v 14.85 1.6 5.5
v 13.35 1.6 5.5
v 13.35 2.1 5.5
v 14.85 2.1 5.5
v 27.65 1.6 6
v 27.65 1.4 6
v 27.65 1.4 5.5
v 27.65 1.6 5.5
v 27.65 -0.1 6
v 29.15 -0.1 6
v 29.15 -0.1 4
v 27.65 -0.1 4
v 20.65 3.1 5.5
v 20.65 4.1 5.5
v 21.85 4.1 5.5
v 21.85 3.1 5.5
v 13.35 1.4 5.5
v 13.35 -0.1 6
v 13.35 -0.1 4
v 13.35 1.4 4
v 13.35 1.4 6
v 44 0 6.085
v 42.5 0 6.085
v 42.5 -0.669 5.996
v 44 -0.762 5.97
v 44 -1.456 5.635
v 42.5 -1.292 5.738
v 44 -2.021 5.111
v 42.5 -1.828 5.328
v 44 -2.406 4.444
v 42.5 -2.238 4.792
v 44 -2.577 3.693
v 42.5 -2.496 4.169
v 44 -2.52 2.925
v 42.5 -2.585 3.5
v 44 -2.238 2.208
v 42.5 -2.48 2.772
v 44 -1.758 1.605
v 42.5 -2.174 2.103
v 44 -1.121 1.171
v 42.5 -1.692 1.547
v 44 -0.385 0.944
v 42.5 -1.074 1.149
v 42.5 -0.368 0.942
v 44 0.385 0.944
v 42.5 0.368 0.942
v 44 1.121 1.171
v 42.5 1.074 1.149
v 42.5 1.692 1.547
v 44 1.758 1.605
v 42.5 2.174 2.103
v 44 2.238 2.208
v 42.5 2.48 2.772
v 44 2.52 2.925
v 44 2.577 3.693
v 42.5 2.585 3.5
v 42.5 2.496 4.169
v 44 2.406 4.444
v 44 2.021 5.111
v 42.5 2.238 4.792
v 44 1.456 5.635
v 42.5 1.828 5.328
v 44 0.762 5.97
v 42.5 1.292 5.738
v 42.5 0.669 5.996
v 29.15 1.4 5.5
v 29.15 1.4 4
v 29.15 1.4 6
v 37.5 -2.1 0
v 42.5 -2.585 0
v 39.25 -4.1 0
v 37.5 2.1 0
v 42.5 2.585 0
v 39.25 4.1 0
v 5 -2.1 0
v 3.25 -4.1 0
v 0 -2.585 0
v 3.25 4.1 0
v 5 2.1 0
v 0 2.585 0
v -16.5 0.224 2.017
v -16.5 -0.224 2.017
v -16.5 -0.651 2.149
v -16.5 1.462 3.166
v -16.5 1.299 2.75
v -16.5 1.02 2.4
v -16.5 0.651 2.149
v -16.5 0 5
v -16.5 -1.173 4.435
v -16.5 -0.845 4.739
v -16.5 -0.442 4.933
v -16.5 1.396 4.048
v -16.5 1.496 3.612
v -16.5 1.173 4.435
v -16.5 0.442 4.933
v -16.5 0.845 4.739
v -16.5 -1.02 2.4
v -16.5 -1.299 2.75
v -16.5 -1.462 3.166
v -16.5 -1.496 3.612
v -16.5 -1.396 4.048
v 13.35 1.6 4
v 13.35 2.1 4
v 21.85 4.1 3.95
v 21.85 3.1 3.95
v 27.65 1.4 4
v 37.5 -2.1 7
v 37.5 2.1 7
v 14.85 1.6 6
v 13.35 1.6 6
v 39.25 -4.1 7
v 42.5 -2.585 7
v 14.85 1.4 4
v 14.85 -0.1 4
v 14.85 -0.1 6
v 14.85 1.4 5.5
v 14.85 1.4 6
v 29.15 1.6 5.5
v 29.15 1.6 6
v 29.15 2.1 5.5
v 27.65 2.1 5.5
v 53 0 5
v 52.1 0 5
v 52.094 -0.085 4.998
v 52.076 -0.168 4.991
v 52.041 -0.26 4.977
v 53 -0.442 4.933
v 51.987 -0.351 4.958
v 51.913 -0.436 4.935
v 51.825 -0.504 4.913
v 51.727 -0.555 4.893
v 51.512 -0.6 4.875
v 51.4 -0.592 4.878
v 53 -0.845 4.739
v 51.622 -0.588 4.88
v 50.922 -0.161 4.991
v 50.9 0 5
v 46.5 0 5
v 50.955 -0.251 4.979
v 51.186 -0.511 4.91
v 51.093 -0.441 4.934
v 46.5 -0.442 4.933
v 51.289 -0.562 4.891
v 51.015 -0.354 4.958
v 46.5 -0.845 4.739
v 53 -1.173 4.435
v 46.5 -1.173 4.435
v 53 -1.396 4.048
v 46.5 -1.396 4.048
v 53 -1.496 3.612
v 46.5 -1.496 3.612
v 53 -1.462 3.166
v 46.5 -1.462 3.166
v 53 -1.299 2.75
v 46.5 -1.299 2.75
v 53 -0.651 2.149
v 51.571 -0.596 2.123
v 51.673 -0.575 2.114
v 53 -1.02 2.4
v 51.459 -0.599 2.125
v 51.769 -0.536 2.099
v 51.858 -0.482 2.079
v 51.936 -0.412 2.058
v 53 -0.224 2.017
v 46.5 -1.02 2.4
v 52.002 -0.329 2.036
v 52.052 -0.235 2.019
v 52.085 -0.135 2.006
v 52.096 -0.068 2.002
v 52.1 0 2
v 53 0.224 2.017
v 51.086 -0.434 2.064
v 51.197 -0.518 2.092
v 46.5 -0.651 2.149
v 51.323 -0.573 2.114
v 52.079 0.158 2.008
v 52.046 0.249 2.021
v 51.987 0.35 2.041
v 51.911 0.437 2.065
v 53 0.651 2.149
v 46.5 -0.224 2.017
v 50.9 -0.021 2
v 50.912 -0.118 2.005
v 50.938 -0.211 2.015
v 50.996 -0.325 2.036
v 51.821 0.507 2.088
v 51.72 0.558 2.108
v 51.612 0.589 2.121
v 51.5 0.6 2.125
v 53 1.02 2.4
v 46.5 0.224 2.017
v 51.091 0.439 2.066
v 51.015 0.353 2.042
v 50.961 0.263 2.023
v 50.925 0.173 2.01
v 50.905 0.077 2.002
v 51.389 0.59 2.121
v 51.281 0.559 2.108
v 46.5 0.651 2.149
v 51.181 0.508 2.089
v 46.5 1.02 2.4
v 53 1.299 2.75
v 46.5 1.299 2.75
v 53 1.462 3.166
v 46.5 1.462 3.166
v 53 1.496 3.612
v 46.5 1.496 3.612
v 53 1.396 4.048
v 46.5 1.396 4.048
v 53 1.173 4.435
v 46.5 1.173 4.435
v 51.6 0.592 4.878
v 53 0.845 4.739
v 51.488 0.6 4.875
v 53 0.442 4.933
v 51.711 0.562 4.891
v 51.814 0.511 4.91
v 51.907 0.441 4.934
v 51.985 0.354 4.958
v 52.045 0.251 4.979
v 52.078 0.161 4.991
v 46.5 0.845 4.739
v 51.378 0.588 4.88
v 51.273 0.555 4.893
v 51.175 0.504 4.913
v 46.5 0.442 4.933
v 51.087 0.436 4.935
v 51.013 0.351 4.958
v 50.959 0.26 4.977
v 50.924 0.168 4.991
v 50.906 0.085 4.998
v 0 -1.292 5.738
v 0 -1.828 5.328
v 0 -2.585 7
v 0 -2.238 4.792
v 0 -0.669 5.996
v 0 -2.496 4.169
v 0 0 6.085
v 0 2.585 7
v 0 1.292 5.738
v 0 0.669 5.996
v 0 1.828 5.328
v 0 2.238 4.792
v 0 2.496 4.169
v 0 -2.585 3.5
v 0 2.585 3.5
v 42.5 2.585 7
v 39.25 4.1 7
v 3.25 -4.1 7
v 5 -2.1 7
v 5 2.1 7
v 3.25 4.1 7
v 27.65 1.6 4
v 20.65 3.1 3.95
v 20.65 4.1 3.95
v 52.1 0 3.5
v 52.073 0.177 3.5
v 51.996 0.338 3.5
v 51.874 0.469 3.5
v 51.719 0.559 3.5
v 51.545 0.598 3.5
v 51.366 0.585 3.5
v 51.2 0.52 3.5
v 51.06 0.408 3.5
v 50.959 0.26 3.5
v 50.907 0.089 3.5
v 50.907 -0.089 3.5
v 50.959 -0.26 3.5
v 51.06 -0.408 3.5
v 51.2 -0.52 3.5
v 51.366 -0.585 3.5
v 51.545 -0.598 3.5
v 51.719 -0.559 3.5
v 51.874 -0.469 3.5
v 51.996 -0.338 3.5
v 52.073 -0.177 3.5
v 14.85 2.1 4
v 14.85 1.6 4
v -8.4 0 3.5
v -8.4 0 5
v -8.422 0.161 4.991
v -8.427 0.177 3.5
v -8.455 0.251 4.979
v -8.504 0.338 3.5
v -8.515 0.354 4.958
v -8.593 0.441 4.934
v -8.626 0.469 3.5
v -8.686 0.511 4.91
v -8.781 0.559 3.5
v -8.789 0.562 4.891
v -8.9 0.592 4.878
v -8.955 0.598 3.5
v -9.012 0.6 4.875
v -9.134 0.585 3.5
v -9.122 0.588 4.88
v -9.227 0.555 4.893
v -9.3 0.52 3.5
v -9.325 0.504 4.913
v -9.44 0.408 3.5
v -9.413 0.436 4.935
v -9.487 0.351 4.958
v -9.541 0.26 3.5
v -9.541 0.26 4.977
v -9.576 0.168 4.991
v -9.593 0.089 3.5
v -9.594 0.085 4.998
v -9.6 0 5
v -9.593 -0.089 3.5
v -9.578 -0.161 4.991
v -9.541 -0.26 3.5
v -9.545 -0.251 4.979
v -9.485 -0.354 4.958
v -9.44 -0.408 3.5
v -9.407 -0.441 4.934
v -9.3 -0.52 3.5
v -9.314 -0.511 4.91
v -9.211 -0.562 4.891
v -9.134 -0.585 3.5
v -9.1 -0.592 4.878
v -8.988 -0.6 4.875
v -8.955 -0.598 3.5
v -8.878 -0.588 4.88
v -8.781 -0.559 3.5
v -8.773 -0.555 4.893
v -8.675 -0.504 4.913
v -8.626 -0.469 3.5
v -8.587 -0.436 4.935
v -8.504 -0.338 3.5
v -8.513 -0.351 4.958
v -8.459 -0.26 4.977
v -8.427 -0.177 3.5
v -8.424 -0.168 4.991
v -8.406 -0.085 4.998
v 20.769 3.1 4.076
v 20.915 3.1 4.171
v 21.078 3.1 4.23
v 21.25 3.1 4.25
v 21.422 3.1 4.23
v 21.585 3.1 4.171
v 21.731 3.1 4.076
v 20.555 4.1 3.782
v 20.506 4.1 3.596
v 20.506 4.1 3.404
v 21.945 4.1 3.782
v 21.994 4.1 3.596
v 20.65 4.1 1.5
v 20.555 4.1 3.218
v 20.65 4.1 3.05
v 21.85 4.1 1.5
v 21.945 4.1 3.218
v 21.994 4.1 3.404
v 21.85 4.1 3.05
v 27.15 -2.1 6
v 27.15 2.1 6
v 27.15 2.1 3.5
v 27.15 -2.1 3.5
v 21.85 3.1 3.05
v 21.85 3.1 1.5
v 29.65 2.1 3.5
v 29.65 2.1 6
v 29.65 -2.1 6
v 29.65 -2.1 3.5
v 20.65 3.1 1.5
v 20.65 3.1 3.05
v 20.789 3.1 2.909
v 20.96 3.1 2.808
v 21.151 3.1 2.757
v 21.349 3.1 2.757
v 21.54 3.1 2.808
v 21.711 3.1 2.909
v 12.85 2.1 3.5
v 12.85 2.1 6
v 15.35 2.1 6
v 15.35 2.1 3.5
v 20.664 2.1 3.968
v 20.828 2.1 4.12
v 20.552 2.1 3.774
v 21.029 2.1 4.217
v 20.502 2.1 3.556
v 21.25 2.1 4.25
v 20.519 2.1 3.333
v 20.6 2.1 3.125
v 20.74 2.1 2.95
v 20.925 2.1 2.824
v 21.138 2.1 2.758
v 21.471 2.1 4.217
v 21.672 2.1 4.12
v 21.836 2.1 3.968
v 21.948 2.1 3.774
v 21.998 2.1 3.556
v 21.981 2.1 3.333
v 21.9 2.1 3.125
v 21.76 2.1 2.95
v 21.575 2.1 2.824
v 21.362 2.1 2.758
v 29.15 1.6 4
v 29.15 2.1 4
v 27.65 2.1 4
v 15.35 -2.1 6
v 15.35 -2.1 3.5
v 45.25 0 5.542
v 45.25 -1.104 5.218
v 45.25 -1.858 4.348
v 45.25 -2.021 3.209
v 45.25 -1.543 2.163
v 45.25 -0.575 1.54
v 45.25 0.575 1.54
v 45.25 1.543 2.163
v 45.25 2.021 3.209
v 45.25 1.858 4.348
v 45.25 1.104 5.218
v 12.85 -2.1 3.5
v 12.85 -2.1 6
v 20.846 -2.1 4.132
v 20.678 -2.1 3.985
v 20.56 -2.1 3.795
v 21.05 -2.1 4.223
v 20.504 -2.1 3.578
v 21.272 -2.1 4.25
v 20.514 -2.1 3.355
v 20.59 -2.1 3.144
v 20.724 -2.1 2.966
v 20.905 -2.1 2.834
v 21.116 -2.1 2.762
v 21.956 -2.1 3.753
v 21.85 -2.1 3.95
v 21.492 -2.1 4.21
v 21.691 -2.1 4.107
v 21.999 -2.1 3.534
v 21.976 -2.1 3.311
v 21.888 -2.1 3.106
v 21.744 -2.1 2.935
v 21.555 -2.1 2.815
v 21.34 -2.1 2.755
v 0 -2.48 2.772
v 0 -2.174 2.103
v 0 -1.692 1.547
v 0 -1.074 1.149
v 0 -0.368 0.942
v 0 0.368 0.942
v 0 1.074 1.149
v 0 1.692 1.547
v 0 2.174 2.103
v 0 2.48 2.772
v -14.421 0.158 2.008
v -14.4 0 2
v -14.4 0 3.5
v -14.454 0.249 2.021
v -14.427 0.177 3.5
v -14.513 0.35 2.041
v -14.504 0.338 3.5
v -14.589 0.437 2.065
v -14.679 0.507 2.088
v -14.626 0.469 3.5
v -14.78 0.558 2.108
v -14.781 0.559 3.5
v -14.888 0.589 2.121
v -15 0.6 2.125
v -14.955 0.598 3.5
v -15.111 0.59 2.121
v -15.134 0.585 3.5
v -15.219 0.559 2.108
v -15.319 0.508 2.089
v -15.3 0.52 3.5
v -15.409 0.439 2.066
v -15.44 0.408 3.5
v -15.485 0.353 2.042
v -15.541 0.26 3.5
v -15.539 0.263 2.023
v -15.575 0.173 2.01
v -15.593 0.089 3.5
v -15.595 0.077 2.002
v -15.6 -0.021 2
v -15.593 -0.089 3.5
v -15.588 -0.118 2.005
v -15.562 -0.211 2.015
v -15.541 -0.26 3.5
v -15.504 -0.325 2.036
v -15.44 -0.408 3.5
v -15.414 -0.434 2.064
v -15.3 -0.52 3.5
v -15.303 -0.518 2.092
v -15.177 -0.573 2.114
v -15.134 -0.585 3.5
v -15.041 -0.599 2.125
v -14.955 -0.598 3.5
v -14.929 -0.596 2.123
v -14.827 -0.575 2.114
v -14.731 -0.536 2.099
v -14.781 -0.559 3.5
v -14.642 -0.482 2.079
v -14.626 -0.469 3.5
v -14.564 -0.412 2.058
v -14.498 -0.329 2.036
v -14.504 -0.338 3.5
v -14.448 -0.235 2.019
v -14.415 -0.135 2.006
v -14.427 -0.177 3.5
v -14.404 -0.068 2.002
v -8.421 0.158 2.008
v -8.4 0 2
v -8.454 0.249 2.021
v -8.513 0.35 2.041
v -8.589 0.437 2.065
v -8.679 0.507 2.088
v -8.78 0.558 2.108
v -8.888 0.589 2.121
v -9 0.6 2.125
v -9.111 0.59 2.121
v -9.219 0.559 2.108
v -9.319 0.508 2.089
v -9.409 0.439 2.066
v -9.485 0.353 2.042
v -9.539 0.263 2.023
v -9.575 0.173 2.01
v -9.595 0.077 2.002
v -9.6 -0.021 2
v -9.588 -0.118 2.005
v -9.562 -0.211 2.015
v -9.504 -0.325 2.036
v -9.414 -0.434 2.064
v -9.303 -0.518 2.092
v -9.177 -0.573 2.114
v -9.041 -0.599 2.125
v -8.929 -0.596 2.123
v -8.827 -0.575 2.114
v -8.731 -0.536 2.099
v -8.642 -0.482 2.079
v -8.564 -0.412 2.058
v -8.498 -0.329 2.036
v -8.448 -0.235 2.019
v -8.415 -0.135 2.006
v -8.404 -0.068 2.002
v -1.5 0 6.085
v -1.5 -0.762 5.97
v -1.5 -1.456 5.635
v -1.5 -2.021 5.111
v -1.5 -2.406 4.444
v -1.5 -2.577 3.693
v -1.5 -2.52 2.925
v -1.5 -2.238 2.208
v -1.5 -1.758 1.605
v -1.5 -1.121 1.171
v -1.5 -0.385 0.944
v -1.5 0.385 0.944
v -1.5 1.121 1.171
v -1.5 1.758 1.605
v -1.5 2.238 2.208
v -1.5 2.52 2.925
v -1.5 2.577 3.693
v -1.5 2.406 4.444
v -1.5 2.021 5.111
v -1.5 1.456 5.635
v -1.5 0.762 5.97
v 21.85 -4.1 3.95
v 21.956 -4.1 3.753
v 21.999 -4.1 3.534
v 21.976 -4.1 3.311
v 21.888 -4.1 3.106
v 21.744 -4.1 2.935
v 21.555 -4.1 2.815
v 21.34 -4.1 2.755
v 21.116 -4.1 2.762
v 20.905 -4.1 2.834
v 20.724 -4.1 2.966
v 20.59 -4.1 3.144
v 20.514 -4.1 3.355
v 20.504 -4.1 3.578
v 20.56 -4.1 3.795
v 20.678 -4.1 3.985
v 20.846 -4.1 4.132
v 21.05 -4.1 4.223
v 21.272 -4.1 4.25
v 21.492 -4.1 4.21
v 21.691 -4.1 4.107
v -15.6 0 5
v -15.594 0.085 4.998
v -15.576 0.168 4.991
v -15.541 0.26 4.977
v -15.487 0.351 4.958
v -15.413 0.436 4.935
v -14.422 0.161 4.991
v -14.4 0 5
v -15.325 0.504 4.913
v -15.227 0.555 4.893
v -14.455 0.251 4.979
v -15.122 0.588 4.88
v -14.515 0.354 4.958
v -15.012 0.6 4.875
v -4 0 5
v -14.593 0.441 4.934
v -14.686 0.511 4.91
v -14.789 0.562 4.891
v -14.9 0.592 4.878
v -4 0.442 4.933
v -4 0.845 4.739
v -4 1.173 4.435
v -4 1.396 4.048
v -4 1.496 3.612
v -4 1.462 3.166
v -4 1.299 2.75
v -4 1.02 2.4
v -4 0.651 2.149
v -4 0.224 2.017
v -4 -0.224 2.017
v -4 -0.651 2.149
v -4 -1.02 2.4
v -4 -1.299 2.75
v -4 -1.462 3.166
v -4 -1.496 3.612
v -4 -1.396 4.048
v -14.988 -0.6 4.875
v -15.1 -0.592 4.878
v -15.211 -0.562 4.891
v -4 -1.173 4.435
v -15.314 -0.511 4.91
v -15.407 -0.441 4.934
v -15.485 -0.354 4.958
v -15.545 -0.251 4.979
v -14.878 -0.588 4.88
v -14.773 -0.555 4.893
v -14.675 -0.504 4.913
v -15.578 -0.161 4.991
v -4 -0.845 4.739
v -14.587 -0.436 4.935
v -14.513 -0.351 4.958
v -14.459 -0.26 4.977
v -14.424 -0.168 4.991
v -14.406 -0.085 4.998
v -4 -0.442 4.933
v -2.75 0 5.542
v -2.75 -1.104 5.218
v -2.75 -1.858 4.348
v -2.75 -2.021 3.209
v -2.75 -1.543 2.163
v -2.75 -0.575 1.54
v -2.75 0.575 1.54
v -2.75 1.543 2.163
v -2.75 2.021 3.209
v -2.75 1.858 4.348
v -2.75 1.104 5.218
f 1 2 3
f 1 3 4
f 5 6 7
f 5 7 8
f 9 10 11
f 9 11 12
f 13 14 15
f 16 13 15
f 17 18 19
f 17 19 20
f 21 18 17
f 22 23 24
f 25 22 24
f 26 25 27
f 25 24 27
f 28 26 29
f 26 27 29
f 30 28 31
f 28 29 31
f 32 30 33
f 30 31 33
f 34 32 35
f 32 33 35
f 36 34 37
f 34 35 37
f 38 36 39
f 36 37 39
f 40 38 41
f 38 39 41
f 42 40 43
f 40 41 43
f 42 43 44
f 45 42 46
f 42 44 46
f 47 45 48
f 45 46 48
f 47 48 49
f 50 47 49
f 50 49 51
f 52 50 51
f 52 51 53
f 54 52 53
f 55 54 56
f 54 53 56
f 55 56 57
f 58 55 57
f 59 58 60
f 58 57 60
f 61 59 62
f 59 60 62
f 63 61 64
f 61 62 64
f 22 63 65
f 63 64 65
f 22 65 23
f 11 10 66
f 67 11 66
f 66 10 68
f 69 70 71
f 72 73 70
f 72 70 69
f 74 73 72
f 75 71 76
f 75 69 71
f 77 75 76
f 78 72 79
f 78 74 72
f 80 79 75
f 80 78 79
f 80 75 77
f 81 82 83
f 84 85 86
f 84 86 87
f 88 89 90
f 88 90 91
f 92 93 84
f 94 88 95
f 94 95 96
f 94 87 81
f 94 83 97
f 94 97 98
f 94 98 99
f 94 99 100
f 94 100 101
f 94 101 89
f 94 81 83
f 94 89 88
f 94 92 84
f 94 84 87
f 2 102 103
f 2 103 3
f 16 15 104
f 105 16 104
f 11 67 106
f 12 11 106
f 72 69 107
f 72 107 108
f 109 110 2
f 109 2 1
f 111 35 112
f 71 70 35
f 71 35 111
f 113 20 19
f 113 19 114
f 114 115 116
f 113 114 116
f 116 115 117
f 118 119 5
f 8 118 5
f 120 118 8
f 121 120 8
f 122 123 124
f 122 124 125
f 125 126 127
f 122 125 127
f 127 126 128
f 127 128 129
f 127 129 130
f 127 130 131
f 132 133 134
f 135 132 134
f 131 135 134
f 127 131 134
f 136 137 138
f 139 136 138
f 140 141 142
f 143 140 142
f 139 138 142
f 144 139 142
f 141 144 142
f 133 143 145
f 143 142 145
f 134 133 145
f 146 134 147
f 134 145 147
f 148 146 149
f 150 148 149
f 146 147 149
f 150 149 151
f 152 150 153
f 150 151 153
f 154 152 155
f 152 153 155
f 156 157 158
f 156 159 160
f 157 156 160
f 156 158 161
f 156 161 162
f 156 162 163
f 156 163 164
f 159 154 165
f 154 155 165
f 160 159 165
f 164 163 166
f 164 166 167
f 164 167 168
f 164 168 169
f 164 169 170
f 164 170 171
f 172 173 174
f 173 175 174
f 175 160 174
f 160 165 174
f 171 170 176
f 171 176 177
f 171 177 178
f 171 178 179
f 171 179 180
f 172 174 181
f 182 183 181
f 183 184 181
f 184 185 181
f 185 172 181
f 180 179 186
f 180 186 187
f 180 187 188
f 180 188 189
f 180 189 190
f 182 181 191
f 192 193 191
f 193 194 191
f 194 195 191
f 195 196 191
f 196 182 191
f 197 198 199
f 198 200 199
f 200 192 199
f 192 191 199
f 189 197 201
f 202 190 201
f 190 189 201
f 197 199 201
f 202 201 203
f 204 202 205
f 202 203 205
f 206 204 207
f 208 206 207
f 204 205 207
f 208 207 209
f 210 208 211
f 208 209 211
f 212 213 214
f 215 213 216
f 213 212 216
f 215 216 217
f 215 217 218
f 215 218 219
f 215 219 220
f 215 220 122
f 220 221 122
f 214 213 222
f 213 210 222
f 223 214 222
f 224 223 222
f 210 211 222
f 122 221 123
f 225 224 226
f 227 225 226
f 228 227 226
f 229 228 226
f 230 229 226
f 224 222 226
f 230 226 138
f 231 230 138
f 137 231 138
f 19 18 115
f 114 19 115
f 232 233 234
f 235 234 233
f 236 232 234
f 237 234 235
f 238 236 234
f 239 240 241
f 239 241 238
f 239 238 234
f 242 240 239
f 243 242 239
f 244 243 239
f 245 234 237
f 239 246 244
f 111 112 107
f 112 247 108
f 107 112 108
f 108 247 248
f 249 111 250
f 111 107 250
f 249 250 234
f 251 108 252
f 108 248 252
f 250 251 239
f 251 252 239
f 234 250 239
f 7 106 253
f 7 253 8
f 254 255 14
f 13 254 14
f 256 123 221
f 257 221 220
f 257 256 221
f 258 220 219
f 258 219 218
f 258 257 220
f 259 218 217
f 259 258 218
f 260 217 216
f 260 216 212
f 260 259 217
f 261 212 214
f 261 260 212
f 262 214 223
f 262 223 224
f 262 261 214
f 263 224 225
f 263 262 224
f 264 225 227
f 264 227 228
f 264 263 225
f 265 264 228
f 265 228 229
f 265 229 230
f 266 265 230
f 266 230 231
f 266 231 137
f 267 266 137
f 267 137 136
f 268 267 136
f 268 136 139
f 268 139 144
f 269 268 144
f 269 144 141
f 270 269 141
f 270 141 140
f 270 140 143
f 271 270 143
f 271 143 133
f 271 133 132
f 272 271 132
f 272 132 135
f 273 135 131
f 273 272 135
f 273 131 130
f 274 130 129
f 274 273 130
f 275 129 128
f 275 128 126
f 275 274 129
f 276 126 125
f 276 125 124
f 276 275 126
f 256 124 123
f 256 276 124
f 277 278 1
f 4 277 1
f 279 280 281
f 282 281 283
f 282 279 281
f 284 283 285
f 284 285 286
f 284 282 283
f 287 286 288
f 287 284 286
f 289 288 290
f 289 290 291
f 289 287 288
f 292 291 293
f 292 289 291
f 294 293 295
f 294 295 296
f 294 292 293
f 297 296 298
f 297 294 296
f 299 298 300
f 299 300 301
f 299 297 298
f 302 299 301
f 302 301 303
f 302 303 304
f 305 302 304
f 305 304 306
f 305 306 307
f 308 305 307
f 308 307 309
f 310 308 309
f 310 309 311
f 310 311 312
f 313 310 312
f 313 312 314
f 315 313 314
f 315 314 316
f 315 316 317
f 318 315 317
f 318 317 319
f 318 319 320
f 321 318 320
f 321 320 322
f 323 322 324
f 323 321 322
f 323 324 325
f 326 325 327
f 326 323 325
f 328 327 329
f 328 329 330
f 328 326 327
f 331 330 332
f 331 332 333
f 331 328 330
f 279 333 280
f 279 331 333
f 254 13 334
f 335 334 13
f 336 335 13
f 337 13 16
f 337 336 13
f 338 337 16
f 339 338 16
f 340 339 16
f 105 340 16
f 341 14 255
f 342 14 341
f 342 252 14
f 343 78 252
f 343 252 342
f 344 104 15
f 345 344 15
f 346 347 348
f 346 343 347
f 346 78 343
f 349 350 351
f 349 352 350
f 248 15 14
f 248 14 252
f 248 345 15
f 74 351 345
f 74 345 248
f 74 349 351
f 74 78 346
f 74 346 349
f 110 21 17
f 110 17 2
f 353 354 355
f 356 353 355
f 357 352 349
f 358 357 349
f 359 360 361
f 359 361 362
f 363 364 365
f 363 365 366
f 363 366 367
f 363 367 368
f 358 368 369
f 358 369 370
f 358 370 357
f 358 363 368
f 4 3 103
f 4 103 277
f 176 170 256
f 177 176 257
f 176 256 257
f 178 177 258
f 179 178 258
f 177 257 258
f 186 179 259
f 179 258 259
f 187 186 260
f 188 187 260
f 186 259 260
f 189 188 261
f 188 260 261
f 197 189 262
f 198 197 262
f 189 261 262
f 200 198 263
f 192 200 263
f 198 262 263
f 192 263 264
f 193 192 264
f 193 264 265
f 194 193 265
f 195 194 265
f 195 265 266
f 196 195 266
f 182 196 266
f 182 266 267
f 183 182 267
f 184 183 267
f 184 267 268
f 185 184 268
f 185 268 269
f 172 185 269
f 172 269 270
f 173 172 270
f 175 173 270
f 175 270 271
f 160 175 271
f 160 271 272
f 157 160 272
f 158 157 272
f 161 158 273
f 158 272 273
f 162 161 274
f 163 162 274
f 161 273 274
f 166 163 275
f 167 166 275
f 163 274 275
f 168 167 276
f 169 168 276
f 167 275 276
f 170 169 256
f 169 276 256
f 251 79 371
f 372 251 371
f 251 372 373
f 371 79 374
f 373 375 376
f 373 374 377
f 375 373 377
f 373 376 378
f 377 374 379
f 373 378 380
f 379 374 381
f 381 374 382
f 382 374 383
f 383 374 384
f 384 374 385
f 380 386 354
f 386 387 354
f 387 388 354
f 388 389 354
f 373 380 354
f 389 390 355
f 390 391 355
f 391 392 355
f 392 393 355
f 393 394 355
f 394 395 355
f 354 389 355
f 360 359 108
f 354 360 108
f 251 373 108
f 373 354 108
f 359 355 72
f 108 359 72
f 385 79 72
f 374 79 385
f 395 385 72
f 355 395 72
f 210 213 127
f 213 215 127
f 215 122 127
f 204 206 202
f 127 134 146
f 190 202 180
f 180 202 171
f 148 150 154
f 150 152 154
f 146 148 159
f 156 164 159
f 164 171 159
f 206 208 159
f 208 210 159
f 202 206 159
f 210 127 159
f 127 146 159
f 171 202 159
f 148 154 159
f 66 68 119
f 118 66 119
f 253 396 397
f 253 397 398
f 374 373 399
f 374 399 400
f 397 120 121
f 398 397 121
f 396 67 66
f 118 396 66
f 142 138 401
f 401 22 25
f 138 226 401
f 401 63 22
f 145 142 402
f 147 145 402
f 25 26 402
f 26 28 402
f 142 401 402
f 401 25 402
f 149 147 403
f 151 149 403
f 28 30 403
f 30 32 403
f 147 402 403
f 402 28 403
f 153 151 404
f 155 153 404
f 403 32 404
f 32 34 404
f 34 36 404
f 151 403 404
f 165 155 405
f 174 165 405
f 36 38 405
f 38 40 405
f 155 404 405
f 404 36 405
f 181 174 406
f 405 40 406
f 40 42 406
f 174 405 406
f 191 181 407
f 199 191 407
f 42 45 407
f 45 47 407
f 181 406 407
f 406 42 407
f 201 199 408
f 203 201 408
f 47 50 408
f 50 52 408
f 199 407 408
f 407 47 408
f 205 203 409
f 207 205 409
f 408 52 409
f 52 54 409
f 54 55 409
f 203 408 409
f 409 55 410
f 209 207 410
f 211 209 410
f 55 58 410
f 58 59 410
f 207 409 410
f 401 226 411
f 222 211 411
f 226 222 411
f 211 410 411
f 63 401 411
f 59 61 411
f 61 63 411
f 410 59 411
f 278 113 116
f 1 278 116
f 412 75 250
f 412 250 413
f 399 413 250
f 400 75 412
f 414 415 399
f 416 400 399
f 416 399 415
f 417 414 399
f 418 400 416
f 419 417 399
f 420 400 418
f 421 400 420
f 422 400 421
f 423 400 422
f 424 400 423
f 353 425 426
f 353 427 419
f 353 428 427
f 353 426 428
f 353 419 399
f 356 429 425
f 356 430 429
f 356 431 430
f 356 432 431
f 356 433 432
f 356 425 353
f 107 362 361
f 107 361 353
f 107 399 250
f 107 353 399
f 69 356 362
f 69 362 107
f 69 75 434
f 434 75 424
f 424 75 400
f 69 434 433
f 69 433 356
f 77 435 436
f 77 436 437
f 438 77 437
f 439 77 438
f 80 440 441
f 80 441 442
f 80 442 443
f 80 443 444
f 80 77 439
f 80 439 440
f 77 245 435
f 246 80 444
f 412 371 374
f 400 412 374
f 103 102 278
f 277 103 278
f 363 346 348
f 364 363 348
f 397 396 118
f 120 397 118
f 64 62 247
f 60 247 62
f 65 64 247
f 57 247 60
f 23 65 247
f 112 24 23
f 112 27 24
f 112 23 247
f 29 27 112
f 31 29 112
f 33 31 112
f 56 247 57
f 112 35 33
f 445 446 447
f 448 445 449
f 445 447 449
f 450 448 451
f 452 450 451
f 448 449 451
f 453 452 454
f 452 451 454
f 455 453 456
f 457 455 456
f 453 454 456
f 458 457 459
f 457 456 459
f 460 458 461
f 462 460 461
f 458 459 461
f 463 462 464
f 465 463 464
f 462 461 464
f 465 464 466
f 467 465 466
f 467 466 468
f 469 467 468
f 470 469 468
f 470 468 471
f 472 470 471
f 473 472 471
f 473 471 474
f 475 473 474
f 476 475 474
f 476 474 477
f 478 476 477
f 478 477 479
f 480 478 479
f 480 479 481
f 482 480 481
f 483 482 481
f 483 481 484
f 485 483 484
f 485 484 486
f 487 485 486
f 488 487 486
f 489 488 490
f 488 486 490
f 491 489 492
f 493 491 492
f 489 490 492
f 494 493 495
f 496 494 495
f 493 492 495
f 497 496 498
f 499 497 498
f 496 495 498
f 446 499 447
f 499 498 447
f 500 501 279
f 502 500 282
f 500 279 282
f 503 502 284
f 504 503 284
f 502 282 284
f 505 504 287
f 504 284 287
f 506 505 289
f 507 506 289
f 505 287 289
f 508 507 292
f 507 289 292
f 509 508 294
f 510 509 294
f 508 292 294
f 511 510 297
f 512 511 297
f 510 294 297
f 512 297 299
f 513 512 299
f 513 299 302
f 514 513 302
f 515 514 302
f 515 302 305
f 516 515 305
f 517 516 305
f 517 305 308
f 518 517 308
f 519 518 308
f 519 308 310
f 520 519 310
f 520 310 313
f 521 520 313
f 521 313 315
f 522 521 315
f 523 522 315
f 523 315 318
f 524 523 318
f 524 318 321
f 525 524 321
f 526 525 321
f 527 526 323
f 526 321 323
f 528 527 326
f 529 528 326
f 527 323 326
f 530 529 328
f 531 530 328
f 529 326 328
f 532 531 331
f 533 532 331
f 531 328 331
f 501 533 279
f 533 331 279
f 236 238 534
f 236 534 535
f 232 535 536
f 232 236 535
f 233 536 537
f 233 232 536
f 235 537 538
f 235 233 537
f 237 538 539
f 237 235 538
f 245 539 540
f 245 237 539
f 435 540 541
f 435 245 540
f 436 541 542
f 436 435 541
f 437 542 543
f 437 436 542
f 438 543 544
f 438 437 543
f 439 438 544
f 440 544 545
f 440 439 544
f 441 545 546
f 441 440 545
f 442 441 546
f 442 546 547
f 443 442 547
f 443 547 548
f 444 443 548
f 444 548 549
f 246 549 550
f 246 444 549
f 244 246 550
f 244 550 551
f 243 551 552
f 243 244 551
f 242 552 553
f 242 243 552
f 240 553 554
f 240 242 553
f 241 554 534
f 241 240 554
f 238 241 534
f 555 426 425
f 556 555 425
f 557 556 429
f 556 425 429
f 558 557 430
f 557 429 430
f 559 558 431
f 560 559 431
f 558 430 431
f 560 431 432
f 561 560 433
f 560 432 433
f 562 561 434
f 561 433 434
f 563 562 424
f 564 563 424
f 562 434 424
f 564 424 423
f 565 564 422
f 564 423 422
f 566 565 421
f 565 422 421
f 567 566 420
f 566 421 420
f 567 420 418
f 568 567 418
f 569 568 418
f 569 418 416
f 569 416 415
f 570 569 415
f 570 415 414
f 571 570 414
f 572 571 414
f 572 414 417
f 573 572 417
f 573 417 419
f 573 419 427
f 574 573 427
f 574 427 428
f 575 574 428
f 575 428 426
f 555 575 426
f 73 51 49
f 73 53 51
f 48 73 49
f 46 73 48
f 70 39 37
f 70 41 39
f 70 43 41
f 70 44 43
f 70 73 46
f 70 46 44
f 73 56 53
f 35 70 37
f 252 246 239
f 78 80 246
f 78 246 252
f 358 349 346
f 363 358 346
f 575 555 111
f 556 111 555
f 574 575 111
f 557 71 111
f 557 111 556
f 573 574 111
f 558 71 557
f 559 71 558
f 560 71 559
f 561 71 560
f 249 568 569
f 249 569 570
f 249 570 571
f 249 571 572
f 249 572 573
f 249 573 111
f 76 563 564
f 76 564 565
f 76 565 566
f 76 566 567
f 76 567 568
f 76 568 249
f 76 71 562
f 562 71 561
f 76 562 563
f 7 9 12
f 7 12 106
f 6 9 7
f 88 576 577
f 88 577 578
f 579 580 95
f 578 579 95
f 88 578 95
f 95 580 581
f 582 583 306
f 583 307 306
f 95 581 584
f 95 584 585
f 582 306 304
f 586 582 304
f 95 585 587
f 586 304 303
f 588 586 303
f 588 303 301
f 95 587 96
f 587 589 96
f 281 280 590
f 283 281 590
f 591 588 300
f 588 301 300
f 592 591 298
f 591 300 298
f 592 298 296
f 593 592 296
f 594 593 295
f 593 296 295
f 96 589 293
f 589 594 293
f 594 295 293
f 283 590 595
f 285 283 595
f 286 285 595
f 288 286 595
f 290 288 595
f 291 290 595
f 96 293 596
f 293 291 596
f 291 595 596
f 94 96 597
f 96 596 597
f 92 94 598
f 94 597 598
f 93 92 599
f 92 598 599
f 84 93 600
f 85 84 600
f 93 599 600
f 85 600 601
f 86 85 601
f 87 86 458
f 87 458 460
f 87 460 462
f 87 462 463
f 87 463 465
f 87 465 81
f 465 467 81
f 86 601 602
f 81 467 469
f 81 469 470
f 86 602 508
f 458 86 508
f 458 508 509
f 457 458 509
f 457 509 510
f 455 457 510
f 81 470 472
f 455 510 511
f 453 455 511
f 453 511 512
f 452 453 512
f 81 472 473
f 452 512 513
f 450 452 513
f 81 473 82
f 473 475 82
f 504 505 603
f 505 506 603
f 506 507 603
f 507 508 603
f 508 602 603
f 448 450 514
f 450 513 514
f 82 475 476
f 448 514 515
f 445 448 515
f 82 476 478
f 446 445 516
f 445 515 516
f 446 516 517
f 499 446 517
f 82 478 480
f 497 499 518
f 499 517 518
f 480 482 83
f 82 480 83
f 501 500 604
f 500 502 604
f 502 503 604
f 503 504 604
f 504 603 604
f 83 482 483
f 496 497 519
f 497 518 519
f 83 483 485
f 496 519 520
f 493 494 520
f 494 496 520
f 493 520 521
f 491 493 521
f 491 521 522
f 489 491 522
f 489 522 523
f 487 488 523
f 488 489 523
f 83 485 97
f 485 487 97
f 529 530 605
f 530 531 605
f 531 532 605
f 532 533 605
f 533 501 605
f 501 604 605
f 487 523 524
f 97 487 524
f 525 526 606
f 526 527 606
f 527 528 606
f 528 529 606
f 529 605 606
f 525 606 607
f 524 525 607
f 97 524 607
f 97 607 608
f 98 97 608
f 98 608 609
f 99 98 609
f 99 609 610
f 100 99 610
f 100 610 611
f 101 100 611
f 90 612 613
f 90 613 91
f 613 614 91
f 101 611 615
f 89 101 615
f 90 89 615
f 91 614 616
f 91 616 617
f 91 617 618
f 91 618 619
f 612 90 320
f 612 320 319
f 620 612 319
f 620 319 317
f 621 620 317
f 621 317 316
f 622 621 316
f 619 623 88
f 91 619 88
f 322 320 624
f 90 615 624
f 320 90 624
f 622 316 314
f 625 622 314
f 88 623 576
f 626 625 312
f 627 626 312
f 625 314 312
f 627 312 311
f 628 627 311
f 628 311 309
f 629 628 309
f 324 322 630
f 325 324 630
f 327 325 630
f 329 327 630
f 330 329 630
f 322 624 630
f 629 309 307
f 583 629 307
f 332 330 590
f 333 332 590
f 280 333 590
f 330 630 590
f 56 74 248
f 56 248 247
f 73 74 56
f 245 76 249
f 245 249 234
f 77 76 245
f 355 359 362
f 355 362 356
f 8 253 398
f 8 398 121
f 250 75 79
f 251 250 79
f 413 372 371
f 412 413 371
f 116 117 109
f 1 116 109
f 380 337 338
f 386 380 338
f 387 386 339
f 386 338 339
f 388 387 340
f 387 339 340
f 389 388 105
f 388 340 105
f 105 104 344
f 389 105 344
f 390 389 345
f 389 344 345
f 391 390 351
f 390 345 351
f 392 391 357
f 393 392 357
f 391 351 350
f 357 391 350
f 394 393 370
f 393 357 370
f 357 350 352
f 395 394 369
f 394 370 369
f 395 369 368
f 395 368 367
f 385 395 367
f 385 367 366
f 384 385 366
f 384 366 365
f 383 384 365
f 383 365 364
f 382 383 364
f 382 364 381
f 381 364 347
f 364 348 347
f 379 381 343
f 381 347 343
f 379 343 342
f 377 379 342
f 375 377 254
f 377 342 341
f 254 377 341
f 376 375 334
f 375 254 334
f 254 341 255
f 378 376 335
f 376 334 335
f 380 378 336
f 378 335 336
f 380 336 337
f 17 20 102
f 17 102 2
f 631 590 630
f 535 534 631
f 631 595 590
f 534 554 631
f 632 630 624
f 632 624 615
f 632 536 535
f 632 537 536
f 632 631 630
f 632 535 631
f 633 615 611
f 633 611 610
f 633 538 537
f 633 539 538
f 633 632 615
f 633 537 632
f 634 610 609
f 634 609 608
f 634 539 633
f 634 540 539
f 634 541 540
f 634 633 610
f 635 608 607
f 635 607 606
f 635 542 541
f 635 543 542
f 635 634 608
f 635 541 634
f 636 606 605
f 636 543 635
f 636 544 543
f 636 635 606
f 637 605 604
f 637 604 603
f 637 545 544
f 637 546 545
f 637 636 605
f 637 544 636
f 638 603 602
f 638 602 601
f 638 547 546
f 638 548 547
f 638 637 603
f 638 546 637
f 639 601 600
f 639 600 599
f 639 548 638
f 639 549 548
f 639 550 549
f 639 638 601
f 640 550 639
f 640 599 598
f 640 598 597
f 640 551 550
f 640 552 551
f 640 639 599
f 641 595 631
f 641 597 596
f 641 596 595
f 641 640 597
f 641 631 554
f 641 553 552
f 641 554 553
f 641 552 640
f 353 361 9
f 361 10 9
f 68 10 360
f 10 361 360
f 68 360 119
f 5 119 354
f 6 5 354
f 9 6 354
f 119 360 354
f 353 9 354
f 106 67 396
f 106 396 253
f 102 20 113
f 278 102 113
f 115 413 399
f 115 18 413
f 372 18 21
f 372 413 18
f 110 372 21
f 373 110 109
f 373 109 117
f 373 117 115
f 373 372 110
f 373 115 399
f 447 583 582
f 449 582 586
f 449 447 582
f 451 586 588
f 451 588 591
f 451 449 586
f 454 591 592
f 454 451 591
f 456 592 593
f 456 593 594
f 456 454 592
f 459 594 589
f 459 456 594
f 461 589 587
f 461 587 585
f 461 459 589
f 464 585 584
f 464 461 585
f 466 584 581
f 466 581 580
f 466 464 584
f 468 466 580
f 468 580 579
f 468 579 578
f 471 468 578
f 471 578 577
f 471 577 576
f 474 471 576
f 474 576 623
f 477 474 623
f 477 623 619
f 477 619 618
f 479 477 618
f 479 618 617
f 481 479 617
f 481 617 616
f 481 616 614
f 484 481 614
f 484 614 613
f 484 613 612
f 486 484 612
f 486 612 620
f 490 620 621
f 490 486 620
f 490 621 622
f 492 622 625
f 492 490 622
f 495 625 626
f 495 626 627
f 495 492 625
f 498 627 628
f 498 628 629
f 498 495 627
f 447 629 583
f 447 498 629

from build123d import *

# Parameters (mm, degrees)
SKETCH1_W                   = 32.5
SKETCH1_H                   = 4.2
BASEFORM_DEPTH              = 7
SKETCH2_R                   = 0.75
HUMERUSAXLEHOLE1_DEPTH      = 2
HUMERUSAXLELOCK_DEPTH       = 1
SKETCH6_R                   = 1.5
AXLEEXTENSION_DEPTH         = 6
SKETCH7_R                   = 0.6
SCREWHOLES_DEPTH            = 54.273445543
SCREWHOLES_DEPTH_BACK       = 54.273445543
SKETCH8_W                   = 2.5
SKETCH8_H                   = 2.5
HUMERUSTUBEHOLDERBASE_DEPTH = 4.2
SKETCH13_W                  = 1.5
SKETCH13_H                  = 1.5
TUBECLIPENTRANCE_DEPTH      = 2
SKETCH14_W                  = 1.5
SKETCH14_H                  = 1.5
CABLECLIPLOCKSLOT_DEPTH     = 0.7
SKETCH15_W                  = 1.5
SKETCH15_H                  = 0.2
TUBECLIPLOCKCLEARANCE_DEPTH = 2
SKETCH12_R                  = 0.75
HUMERUSAXLEHOLE2_DEPTH      = 54.818584249


with BuildPart() as part:
    # Sketch1 → BaseForm (new body)
    with BuildSketch(Plane.XY):
        Polygon((0, -2.584500111), (0, 2.584500111), (3.25, 4.1), (39.25, 4.1), (42.5, 2.584500111), (42.5, -2.584500111), (39.25, -4.1), (3.25, -4.1), align=None)
        with Locations((21.25, 0)):
            Rectangle(SKETCH1_W, SKETCH1_H, mode=Mode.SUBTRACT)
    extrude(amount=BASEFORM_DEPTH)

    # Sketch2 → HumerusAxleHole1 (cut)
    with BuildSketch(Plane(origin=(0, 4.1, 0), x_dir=(1, 0, 0), z_dir=(0, 1, 0))):
        with Locations(Location((21.25, -3.5, 0), (0, 0, 270))):
            Circle(SKETCH2_R)
    extrude(amount=-HUMERUSAXLEHOLE1_DEPTH, mode=Mode.SUBTRACT)

    # Sketch2_4 → HumerusAxleLock (cut)
    with BuildSketch(Plane(origin=(0, 4.1, 0), x_dir=(1, 0, 0), z_dir=(0, 1, 0))):
        with BuildLine():
            ThreePointArc((20.65, -3.05), (21.25, -2.75), (21.85, -3.05))
            Line((21.85, -3.05), (21.85, -1.5))
            Line((21.85, -1.5), (20.65, -1.5))
            Line((20.65, -1.5), (20.65, -3.05))
        make_face()
        with BuildLine():
            Line((21.85, -5.5), (21.85, -3.95))
            ThreePointArc((21.85, -3.95), (21.25, -4.25), (20.65, -3.95))
            Line((20.65, -3.95), (20.65, -5.5))
            Line((20.65, -5.5), (21.85, -5.5))
        make_face()
    extrude(amount=-HUMERUSAXLELOCK_DEPTH, mode=Mode.SUBTRACT)

    # Sketch5 → Axle (revolve)
    with BuildSketch(Plane.XY.offset(3.5), mode=Mode.PRIVATE) as axle_sk:
        Polygon((53, 0), (53, 1.5), (46.5, 1.5), (44, 2.584500111), (42.5, 2.584500111), (42.5, 0), align=None)
    axle = revolve(axle_sk.sketch.rotate(Axis((42.5, 0, 3.5), (1, 0, 0)), 90), axis=Axis((42.5, 0, 3.5), (1, 0, 0)))

    # Axle2: Axle across plane
    add(axle.mirror(Plane.ZY.offset(-21.25)))

    # Sketch6 → AxleExtension (add)
    with BuildSketch(Plane.ZY.offset(10.5)):
        with Locations((3.5, 0)):
            Circle(SKETCH6_R)
    extrude(amount=AXLEEXTENSION_DEPTH)

    # Sketch7 → ScrewHoles (cut, two sides)
    with BuildSketch(Plane.XY.offset(3.5)) as screwholes_sk:
        with Locations((-9, 0)):
            Circle(SKETCH7_R)
        with Locations((-15, 0)):
            Circle(SKETCH7_R)
        with Locations((51.5, 0)):
            Circle(SKETCH7_R)
    extrude(amount=SCREWHOLES_DEPTH, mode=Mode.SUBTRACT)
    extrude(screwholes_sk.sketch, amount=-SCREWHOLES_DEPTH_BACK, mode=Mode.SUBTRACT)

    # Sketch8 → HumerusTubeHolderBase (add)
    with BuildSketch(Plane(origin=(0, 2.1, 0), x_dir=(1, 0, 0), z_dir=(0, 1, 0))):
        with Locations((14.1, -4.75)):
            Rectangle(SKETCH8_W, SKETCH8_H)
    humerustubeholderbase = extrude(amount=-HUMERUSTUBEHOLDERBASE_DEPTH)

    # Sketch13 → TubeClipEntrance (cut)
    with BuildSketch(Plane.XY.offset(6)):
        with Locations((14.1, 0.65)):
            Rectangle(SKETCH13_W, SKETCH13_H)
    tubeclipentrance = extrude(amount=-TUBECLIPENTRANCE_DEPTH, mode=Mode.SUBTRACT)

    # Sketch14 → CableClipLockSlot (cut)
    with BuildSketch(Plane.XZ.offset(-1.4)):
        with Locations((14.1, 4.75)):
            Rectangle(SKETCH14_W, SKETCH14_H)
    cablecliplockslot = extrude(amount=-CABLECLIPLOCKSLOT_DEPTH, mode=Mode.SUBTRACT)

    # Sketch15 → TubeClipLockClearance (cut)
    with BuildSketch(Plane.XY.offset(6)):
        with Locations((14.1, 1.5)):
            Rectangle(SKETCH15_W, SKETCH15_H)
    tubecliplockclearance = extrude(amount=-TUBECLIPLOCKCLEARANCE_DEPTH, mode=Mode.SUBTRACT)

    # Sketch12 → HumerusAxleHole2 (cut, through all)
    with BuildSketch(Plane(origin=(0, -2.1, 0), x_dir=(1, 0, 0), z_dir=(0, 1, 0))):
        with Locations(Location((21.25, -3.5, 0), (0, 0, 323.130102354))):
            Circle(SKETCH12_R)
    extrude(amount=-HUMERUSAXLEHOLE2_DEPTH, mode=Mode.SUBTRACT)

    # TubeClipSlot2: HumerusTubeHolderBase, TubeClipEntrance, CableClipLockSlot, TubeClipLockClearance across plane
    add(humerustubeholderbase.mirror(Plane(origin=(21.25, 0, 0), x_dir=(0, 0, 1), z_dir=(1, 0, 0))))
    add(tubeclipentrance.mirror(Plane(origin=(21.25, 0, 0), x_dir=(0, 0, 1), z_dir=(1, 0, 0))), mode=Mode.SUBTRACT)
    add(cablecliplockslot.mirror(Plane(origin=(21.25, 0, 0), x_dir=(0, 0, 1), z_dir=(1, 0, 0))), mode=Mode.SUBTRACT)
    add(tubecliplockclearance.mirror(Plane(origin=(21.25, 0, 0), x_dir=(0, 0, 1), z_dir=(1, 0, 0))), mode=Mode.SUBTRACT)


solid = part.part
